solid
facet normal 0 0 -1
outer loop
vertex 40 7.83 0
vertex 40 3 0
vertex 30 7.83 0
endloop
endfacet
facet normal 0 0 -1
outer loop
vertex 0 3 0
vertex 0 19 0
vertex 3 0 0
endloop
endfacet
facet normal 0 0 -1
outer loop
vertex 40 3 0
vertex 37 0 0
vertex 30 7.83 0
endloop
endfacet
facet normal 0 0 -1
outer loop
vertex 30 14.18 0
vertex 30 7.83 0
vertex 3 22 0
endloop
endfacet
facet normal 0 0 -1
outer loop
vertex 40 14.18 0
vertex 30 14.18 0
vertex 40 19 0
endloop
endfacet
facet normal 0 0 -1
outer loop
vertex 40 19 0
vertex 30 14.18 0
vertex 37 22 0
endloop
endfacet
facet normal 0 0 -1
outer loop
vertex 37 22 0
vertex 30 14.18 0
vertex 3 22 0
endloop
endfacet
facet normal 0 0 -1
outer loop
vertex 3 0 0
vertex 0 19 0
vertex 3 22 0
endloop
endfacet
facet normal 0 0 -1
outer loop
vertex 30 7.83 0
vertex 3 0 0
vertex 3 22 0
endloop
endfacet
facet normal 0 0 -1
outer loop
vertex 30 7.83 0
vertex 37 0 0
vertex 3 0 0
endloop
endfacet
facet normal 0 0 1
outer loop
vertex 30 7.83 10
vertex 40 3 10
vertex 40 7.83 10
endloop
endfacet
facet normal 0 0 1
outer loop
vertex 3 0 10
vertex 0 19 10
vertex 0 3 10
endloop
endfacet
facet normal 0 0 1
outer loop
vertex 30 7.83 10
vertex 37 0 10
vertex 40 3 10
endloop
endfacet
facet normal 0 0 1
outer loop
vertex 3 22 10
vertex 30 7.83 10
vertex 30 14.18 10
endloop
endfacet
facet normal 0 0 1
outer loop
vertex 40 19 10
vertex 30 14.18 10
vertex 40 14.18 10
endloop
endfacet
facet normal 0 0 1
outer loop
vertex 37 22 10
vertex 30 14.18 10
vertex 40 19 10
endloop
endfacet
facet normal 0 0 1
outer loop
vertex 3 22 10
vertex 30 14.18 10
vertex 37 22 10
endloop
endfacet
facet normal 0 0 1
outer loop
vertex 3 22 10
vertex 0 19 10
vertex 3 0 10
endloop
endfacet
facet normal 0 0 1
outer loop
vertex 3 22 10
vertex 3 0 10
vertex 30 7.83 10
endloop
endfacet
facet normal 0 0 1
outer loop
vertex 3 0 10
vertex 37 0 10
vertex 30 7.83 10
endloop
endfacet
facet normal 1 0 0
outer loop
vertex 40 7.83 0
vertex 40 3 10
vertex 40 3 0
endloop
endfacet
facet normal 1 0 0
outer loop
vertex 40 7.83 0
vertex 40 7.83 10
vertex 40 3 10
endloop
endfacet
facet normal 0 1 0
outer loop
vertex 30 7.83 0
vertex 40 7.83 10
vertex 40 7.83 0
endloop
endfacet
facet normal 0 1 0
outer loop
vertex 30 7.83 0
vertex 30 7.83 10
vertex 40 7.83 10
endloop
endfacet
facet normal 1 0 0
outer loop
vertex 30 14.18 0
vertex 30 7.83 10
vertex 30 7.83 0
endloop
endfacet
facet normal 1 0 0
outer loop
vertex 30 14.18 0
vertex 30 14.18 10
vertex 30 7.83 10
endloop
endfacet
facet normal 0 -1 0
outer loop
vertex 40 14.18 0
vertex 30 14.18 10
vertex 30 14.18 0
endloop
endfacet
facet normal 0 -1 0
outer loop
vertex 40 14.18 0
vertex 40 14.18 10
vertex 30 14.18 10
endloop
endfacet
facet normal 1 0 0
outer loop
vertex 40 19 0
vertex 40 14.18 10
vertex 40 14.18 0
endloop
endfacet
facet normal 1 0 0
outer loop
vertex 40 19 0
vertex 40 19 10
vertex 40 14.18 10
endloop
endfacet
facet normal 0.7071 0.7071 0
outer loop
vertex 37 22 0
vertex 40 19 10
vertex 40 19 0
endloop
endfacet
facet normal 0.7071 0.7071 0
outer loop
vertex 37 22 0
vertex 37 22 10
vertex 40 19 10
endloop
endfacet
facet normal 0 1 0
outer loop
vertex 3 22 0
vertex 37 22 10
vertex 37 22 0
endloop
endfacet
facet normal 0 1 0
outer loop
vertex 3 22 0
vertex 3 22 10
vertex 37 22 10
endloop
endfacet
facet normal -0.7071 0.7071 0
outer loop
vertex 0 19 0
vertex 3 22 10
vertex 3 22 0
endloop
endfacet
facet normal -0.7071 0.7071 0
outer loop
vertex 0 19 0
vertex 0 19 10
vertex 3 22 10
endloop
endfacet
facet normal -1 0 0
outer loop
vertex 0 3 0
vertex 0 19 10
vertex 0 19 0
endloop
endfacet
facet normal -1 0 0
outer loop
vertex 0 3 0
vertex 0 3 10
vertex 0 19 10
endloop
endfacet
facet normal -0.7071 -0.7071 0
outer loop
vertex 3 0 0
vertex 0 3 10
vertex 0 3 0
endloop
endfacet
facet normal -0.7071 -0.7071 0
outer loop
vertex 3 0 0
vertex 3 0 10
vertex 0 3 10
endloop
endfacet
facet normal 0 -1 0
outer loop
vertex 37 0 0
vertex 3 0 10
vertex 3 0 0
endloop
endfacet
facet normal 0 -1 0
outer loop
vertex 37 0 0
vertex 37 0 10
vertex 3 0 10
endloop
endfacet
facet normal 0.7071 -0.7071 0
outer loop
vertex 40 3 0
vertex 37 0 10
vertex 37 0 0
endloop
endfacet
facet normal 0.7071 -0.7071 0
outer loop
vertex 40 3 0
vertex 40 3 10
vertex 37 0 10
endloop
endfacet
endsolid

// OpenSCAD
$fn = 32;

// ----------------------------------------------------------------------
// C washer: 40 x 22 mm plate with an open slot
// ----------------------------------------------------------------------

// --- parameters (mm) ---
profile_height = 10;      // extrusion height
profile_points = 12;      // points of the closed outline

profile = [[3, 0], [37, 0], [40, 3], [40, 7.83], [30, 7.83], [30, 14.18], [40, 14.18], [40, 19], [37, 22], [3, 22], [0, 19], [0, 3]];  // single closed polygon, 12 points, counter clockwise

// --- the one profile operation ---
linear_extrude(height = profile_height) polygon(points = profile);
